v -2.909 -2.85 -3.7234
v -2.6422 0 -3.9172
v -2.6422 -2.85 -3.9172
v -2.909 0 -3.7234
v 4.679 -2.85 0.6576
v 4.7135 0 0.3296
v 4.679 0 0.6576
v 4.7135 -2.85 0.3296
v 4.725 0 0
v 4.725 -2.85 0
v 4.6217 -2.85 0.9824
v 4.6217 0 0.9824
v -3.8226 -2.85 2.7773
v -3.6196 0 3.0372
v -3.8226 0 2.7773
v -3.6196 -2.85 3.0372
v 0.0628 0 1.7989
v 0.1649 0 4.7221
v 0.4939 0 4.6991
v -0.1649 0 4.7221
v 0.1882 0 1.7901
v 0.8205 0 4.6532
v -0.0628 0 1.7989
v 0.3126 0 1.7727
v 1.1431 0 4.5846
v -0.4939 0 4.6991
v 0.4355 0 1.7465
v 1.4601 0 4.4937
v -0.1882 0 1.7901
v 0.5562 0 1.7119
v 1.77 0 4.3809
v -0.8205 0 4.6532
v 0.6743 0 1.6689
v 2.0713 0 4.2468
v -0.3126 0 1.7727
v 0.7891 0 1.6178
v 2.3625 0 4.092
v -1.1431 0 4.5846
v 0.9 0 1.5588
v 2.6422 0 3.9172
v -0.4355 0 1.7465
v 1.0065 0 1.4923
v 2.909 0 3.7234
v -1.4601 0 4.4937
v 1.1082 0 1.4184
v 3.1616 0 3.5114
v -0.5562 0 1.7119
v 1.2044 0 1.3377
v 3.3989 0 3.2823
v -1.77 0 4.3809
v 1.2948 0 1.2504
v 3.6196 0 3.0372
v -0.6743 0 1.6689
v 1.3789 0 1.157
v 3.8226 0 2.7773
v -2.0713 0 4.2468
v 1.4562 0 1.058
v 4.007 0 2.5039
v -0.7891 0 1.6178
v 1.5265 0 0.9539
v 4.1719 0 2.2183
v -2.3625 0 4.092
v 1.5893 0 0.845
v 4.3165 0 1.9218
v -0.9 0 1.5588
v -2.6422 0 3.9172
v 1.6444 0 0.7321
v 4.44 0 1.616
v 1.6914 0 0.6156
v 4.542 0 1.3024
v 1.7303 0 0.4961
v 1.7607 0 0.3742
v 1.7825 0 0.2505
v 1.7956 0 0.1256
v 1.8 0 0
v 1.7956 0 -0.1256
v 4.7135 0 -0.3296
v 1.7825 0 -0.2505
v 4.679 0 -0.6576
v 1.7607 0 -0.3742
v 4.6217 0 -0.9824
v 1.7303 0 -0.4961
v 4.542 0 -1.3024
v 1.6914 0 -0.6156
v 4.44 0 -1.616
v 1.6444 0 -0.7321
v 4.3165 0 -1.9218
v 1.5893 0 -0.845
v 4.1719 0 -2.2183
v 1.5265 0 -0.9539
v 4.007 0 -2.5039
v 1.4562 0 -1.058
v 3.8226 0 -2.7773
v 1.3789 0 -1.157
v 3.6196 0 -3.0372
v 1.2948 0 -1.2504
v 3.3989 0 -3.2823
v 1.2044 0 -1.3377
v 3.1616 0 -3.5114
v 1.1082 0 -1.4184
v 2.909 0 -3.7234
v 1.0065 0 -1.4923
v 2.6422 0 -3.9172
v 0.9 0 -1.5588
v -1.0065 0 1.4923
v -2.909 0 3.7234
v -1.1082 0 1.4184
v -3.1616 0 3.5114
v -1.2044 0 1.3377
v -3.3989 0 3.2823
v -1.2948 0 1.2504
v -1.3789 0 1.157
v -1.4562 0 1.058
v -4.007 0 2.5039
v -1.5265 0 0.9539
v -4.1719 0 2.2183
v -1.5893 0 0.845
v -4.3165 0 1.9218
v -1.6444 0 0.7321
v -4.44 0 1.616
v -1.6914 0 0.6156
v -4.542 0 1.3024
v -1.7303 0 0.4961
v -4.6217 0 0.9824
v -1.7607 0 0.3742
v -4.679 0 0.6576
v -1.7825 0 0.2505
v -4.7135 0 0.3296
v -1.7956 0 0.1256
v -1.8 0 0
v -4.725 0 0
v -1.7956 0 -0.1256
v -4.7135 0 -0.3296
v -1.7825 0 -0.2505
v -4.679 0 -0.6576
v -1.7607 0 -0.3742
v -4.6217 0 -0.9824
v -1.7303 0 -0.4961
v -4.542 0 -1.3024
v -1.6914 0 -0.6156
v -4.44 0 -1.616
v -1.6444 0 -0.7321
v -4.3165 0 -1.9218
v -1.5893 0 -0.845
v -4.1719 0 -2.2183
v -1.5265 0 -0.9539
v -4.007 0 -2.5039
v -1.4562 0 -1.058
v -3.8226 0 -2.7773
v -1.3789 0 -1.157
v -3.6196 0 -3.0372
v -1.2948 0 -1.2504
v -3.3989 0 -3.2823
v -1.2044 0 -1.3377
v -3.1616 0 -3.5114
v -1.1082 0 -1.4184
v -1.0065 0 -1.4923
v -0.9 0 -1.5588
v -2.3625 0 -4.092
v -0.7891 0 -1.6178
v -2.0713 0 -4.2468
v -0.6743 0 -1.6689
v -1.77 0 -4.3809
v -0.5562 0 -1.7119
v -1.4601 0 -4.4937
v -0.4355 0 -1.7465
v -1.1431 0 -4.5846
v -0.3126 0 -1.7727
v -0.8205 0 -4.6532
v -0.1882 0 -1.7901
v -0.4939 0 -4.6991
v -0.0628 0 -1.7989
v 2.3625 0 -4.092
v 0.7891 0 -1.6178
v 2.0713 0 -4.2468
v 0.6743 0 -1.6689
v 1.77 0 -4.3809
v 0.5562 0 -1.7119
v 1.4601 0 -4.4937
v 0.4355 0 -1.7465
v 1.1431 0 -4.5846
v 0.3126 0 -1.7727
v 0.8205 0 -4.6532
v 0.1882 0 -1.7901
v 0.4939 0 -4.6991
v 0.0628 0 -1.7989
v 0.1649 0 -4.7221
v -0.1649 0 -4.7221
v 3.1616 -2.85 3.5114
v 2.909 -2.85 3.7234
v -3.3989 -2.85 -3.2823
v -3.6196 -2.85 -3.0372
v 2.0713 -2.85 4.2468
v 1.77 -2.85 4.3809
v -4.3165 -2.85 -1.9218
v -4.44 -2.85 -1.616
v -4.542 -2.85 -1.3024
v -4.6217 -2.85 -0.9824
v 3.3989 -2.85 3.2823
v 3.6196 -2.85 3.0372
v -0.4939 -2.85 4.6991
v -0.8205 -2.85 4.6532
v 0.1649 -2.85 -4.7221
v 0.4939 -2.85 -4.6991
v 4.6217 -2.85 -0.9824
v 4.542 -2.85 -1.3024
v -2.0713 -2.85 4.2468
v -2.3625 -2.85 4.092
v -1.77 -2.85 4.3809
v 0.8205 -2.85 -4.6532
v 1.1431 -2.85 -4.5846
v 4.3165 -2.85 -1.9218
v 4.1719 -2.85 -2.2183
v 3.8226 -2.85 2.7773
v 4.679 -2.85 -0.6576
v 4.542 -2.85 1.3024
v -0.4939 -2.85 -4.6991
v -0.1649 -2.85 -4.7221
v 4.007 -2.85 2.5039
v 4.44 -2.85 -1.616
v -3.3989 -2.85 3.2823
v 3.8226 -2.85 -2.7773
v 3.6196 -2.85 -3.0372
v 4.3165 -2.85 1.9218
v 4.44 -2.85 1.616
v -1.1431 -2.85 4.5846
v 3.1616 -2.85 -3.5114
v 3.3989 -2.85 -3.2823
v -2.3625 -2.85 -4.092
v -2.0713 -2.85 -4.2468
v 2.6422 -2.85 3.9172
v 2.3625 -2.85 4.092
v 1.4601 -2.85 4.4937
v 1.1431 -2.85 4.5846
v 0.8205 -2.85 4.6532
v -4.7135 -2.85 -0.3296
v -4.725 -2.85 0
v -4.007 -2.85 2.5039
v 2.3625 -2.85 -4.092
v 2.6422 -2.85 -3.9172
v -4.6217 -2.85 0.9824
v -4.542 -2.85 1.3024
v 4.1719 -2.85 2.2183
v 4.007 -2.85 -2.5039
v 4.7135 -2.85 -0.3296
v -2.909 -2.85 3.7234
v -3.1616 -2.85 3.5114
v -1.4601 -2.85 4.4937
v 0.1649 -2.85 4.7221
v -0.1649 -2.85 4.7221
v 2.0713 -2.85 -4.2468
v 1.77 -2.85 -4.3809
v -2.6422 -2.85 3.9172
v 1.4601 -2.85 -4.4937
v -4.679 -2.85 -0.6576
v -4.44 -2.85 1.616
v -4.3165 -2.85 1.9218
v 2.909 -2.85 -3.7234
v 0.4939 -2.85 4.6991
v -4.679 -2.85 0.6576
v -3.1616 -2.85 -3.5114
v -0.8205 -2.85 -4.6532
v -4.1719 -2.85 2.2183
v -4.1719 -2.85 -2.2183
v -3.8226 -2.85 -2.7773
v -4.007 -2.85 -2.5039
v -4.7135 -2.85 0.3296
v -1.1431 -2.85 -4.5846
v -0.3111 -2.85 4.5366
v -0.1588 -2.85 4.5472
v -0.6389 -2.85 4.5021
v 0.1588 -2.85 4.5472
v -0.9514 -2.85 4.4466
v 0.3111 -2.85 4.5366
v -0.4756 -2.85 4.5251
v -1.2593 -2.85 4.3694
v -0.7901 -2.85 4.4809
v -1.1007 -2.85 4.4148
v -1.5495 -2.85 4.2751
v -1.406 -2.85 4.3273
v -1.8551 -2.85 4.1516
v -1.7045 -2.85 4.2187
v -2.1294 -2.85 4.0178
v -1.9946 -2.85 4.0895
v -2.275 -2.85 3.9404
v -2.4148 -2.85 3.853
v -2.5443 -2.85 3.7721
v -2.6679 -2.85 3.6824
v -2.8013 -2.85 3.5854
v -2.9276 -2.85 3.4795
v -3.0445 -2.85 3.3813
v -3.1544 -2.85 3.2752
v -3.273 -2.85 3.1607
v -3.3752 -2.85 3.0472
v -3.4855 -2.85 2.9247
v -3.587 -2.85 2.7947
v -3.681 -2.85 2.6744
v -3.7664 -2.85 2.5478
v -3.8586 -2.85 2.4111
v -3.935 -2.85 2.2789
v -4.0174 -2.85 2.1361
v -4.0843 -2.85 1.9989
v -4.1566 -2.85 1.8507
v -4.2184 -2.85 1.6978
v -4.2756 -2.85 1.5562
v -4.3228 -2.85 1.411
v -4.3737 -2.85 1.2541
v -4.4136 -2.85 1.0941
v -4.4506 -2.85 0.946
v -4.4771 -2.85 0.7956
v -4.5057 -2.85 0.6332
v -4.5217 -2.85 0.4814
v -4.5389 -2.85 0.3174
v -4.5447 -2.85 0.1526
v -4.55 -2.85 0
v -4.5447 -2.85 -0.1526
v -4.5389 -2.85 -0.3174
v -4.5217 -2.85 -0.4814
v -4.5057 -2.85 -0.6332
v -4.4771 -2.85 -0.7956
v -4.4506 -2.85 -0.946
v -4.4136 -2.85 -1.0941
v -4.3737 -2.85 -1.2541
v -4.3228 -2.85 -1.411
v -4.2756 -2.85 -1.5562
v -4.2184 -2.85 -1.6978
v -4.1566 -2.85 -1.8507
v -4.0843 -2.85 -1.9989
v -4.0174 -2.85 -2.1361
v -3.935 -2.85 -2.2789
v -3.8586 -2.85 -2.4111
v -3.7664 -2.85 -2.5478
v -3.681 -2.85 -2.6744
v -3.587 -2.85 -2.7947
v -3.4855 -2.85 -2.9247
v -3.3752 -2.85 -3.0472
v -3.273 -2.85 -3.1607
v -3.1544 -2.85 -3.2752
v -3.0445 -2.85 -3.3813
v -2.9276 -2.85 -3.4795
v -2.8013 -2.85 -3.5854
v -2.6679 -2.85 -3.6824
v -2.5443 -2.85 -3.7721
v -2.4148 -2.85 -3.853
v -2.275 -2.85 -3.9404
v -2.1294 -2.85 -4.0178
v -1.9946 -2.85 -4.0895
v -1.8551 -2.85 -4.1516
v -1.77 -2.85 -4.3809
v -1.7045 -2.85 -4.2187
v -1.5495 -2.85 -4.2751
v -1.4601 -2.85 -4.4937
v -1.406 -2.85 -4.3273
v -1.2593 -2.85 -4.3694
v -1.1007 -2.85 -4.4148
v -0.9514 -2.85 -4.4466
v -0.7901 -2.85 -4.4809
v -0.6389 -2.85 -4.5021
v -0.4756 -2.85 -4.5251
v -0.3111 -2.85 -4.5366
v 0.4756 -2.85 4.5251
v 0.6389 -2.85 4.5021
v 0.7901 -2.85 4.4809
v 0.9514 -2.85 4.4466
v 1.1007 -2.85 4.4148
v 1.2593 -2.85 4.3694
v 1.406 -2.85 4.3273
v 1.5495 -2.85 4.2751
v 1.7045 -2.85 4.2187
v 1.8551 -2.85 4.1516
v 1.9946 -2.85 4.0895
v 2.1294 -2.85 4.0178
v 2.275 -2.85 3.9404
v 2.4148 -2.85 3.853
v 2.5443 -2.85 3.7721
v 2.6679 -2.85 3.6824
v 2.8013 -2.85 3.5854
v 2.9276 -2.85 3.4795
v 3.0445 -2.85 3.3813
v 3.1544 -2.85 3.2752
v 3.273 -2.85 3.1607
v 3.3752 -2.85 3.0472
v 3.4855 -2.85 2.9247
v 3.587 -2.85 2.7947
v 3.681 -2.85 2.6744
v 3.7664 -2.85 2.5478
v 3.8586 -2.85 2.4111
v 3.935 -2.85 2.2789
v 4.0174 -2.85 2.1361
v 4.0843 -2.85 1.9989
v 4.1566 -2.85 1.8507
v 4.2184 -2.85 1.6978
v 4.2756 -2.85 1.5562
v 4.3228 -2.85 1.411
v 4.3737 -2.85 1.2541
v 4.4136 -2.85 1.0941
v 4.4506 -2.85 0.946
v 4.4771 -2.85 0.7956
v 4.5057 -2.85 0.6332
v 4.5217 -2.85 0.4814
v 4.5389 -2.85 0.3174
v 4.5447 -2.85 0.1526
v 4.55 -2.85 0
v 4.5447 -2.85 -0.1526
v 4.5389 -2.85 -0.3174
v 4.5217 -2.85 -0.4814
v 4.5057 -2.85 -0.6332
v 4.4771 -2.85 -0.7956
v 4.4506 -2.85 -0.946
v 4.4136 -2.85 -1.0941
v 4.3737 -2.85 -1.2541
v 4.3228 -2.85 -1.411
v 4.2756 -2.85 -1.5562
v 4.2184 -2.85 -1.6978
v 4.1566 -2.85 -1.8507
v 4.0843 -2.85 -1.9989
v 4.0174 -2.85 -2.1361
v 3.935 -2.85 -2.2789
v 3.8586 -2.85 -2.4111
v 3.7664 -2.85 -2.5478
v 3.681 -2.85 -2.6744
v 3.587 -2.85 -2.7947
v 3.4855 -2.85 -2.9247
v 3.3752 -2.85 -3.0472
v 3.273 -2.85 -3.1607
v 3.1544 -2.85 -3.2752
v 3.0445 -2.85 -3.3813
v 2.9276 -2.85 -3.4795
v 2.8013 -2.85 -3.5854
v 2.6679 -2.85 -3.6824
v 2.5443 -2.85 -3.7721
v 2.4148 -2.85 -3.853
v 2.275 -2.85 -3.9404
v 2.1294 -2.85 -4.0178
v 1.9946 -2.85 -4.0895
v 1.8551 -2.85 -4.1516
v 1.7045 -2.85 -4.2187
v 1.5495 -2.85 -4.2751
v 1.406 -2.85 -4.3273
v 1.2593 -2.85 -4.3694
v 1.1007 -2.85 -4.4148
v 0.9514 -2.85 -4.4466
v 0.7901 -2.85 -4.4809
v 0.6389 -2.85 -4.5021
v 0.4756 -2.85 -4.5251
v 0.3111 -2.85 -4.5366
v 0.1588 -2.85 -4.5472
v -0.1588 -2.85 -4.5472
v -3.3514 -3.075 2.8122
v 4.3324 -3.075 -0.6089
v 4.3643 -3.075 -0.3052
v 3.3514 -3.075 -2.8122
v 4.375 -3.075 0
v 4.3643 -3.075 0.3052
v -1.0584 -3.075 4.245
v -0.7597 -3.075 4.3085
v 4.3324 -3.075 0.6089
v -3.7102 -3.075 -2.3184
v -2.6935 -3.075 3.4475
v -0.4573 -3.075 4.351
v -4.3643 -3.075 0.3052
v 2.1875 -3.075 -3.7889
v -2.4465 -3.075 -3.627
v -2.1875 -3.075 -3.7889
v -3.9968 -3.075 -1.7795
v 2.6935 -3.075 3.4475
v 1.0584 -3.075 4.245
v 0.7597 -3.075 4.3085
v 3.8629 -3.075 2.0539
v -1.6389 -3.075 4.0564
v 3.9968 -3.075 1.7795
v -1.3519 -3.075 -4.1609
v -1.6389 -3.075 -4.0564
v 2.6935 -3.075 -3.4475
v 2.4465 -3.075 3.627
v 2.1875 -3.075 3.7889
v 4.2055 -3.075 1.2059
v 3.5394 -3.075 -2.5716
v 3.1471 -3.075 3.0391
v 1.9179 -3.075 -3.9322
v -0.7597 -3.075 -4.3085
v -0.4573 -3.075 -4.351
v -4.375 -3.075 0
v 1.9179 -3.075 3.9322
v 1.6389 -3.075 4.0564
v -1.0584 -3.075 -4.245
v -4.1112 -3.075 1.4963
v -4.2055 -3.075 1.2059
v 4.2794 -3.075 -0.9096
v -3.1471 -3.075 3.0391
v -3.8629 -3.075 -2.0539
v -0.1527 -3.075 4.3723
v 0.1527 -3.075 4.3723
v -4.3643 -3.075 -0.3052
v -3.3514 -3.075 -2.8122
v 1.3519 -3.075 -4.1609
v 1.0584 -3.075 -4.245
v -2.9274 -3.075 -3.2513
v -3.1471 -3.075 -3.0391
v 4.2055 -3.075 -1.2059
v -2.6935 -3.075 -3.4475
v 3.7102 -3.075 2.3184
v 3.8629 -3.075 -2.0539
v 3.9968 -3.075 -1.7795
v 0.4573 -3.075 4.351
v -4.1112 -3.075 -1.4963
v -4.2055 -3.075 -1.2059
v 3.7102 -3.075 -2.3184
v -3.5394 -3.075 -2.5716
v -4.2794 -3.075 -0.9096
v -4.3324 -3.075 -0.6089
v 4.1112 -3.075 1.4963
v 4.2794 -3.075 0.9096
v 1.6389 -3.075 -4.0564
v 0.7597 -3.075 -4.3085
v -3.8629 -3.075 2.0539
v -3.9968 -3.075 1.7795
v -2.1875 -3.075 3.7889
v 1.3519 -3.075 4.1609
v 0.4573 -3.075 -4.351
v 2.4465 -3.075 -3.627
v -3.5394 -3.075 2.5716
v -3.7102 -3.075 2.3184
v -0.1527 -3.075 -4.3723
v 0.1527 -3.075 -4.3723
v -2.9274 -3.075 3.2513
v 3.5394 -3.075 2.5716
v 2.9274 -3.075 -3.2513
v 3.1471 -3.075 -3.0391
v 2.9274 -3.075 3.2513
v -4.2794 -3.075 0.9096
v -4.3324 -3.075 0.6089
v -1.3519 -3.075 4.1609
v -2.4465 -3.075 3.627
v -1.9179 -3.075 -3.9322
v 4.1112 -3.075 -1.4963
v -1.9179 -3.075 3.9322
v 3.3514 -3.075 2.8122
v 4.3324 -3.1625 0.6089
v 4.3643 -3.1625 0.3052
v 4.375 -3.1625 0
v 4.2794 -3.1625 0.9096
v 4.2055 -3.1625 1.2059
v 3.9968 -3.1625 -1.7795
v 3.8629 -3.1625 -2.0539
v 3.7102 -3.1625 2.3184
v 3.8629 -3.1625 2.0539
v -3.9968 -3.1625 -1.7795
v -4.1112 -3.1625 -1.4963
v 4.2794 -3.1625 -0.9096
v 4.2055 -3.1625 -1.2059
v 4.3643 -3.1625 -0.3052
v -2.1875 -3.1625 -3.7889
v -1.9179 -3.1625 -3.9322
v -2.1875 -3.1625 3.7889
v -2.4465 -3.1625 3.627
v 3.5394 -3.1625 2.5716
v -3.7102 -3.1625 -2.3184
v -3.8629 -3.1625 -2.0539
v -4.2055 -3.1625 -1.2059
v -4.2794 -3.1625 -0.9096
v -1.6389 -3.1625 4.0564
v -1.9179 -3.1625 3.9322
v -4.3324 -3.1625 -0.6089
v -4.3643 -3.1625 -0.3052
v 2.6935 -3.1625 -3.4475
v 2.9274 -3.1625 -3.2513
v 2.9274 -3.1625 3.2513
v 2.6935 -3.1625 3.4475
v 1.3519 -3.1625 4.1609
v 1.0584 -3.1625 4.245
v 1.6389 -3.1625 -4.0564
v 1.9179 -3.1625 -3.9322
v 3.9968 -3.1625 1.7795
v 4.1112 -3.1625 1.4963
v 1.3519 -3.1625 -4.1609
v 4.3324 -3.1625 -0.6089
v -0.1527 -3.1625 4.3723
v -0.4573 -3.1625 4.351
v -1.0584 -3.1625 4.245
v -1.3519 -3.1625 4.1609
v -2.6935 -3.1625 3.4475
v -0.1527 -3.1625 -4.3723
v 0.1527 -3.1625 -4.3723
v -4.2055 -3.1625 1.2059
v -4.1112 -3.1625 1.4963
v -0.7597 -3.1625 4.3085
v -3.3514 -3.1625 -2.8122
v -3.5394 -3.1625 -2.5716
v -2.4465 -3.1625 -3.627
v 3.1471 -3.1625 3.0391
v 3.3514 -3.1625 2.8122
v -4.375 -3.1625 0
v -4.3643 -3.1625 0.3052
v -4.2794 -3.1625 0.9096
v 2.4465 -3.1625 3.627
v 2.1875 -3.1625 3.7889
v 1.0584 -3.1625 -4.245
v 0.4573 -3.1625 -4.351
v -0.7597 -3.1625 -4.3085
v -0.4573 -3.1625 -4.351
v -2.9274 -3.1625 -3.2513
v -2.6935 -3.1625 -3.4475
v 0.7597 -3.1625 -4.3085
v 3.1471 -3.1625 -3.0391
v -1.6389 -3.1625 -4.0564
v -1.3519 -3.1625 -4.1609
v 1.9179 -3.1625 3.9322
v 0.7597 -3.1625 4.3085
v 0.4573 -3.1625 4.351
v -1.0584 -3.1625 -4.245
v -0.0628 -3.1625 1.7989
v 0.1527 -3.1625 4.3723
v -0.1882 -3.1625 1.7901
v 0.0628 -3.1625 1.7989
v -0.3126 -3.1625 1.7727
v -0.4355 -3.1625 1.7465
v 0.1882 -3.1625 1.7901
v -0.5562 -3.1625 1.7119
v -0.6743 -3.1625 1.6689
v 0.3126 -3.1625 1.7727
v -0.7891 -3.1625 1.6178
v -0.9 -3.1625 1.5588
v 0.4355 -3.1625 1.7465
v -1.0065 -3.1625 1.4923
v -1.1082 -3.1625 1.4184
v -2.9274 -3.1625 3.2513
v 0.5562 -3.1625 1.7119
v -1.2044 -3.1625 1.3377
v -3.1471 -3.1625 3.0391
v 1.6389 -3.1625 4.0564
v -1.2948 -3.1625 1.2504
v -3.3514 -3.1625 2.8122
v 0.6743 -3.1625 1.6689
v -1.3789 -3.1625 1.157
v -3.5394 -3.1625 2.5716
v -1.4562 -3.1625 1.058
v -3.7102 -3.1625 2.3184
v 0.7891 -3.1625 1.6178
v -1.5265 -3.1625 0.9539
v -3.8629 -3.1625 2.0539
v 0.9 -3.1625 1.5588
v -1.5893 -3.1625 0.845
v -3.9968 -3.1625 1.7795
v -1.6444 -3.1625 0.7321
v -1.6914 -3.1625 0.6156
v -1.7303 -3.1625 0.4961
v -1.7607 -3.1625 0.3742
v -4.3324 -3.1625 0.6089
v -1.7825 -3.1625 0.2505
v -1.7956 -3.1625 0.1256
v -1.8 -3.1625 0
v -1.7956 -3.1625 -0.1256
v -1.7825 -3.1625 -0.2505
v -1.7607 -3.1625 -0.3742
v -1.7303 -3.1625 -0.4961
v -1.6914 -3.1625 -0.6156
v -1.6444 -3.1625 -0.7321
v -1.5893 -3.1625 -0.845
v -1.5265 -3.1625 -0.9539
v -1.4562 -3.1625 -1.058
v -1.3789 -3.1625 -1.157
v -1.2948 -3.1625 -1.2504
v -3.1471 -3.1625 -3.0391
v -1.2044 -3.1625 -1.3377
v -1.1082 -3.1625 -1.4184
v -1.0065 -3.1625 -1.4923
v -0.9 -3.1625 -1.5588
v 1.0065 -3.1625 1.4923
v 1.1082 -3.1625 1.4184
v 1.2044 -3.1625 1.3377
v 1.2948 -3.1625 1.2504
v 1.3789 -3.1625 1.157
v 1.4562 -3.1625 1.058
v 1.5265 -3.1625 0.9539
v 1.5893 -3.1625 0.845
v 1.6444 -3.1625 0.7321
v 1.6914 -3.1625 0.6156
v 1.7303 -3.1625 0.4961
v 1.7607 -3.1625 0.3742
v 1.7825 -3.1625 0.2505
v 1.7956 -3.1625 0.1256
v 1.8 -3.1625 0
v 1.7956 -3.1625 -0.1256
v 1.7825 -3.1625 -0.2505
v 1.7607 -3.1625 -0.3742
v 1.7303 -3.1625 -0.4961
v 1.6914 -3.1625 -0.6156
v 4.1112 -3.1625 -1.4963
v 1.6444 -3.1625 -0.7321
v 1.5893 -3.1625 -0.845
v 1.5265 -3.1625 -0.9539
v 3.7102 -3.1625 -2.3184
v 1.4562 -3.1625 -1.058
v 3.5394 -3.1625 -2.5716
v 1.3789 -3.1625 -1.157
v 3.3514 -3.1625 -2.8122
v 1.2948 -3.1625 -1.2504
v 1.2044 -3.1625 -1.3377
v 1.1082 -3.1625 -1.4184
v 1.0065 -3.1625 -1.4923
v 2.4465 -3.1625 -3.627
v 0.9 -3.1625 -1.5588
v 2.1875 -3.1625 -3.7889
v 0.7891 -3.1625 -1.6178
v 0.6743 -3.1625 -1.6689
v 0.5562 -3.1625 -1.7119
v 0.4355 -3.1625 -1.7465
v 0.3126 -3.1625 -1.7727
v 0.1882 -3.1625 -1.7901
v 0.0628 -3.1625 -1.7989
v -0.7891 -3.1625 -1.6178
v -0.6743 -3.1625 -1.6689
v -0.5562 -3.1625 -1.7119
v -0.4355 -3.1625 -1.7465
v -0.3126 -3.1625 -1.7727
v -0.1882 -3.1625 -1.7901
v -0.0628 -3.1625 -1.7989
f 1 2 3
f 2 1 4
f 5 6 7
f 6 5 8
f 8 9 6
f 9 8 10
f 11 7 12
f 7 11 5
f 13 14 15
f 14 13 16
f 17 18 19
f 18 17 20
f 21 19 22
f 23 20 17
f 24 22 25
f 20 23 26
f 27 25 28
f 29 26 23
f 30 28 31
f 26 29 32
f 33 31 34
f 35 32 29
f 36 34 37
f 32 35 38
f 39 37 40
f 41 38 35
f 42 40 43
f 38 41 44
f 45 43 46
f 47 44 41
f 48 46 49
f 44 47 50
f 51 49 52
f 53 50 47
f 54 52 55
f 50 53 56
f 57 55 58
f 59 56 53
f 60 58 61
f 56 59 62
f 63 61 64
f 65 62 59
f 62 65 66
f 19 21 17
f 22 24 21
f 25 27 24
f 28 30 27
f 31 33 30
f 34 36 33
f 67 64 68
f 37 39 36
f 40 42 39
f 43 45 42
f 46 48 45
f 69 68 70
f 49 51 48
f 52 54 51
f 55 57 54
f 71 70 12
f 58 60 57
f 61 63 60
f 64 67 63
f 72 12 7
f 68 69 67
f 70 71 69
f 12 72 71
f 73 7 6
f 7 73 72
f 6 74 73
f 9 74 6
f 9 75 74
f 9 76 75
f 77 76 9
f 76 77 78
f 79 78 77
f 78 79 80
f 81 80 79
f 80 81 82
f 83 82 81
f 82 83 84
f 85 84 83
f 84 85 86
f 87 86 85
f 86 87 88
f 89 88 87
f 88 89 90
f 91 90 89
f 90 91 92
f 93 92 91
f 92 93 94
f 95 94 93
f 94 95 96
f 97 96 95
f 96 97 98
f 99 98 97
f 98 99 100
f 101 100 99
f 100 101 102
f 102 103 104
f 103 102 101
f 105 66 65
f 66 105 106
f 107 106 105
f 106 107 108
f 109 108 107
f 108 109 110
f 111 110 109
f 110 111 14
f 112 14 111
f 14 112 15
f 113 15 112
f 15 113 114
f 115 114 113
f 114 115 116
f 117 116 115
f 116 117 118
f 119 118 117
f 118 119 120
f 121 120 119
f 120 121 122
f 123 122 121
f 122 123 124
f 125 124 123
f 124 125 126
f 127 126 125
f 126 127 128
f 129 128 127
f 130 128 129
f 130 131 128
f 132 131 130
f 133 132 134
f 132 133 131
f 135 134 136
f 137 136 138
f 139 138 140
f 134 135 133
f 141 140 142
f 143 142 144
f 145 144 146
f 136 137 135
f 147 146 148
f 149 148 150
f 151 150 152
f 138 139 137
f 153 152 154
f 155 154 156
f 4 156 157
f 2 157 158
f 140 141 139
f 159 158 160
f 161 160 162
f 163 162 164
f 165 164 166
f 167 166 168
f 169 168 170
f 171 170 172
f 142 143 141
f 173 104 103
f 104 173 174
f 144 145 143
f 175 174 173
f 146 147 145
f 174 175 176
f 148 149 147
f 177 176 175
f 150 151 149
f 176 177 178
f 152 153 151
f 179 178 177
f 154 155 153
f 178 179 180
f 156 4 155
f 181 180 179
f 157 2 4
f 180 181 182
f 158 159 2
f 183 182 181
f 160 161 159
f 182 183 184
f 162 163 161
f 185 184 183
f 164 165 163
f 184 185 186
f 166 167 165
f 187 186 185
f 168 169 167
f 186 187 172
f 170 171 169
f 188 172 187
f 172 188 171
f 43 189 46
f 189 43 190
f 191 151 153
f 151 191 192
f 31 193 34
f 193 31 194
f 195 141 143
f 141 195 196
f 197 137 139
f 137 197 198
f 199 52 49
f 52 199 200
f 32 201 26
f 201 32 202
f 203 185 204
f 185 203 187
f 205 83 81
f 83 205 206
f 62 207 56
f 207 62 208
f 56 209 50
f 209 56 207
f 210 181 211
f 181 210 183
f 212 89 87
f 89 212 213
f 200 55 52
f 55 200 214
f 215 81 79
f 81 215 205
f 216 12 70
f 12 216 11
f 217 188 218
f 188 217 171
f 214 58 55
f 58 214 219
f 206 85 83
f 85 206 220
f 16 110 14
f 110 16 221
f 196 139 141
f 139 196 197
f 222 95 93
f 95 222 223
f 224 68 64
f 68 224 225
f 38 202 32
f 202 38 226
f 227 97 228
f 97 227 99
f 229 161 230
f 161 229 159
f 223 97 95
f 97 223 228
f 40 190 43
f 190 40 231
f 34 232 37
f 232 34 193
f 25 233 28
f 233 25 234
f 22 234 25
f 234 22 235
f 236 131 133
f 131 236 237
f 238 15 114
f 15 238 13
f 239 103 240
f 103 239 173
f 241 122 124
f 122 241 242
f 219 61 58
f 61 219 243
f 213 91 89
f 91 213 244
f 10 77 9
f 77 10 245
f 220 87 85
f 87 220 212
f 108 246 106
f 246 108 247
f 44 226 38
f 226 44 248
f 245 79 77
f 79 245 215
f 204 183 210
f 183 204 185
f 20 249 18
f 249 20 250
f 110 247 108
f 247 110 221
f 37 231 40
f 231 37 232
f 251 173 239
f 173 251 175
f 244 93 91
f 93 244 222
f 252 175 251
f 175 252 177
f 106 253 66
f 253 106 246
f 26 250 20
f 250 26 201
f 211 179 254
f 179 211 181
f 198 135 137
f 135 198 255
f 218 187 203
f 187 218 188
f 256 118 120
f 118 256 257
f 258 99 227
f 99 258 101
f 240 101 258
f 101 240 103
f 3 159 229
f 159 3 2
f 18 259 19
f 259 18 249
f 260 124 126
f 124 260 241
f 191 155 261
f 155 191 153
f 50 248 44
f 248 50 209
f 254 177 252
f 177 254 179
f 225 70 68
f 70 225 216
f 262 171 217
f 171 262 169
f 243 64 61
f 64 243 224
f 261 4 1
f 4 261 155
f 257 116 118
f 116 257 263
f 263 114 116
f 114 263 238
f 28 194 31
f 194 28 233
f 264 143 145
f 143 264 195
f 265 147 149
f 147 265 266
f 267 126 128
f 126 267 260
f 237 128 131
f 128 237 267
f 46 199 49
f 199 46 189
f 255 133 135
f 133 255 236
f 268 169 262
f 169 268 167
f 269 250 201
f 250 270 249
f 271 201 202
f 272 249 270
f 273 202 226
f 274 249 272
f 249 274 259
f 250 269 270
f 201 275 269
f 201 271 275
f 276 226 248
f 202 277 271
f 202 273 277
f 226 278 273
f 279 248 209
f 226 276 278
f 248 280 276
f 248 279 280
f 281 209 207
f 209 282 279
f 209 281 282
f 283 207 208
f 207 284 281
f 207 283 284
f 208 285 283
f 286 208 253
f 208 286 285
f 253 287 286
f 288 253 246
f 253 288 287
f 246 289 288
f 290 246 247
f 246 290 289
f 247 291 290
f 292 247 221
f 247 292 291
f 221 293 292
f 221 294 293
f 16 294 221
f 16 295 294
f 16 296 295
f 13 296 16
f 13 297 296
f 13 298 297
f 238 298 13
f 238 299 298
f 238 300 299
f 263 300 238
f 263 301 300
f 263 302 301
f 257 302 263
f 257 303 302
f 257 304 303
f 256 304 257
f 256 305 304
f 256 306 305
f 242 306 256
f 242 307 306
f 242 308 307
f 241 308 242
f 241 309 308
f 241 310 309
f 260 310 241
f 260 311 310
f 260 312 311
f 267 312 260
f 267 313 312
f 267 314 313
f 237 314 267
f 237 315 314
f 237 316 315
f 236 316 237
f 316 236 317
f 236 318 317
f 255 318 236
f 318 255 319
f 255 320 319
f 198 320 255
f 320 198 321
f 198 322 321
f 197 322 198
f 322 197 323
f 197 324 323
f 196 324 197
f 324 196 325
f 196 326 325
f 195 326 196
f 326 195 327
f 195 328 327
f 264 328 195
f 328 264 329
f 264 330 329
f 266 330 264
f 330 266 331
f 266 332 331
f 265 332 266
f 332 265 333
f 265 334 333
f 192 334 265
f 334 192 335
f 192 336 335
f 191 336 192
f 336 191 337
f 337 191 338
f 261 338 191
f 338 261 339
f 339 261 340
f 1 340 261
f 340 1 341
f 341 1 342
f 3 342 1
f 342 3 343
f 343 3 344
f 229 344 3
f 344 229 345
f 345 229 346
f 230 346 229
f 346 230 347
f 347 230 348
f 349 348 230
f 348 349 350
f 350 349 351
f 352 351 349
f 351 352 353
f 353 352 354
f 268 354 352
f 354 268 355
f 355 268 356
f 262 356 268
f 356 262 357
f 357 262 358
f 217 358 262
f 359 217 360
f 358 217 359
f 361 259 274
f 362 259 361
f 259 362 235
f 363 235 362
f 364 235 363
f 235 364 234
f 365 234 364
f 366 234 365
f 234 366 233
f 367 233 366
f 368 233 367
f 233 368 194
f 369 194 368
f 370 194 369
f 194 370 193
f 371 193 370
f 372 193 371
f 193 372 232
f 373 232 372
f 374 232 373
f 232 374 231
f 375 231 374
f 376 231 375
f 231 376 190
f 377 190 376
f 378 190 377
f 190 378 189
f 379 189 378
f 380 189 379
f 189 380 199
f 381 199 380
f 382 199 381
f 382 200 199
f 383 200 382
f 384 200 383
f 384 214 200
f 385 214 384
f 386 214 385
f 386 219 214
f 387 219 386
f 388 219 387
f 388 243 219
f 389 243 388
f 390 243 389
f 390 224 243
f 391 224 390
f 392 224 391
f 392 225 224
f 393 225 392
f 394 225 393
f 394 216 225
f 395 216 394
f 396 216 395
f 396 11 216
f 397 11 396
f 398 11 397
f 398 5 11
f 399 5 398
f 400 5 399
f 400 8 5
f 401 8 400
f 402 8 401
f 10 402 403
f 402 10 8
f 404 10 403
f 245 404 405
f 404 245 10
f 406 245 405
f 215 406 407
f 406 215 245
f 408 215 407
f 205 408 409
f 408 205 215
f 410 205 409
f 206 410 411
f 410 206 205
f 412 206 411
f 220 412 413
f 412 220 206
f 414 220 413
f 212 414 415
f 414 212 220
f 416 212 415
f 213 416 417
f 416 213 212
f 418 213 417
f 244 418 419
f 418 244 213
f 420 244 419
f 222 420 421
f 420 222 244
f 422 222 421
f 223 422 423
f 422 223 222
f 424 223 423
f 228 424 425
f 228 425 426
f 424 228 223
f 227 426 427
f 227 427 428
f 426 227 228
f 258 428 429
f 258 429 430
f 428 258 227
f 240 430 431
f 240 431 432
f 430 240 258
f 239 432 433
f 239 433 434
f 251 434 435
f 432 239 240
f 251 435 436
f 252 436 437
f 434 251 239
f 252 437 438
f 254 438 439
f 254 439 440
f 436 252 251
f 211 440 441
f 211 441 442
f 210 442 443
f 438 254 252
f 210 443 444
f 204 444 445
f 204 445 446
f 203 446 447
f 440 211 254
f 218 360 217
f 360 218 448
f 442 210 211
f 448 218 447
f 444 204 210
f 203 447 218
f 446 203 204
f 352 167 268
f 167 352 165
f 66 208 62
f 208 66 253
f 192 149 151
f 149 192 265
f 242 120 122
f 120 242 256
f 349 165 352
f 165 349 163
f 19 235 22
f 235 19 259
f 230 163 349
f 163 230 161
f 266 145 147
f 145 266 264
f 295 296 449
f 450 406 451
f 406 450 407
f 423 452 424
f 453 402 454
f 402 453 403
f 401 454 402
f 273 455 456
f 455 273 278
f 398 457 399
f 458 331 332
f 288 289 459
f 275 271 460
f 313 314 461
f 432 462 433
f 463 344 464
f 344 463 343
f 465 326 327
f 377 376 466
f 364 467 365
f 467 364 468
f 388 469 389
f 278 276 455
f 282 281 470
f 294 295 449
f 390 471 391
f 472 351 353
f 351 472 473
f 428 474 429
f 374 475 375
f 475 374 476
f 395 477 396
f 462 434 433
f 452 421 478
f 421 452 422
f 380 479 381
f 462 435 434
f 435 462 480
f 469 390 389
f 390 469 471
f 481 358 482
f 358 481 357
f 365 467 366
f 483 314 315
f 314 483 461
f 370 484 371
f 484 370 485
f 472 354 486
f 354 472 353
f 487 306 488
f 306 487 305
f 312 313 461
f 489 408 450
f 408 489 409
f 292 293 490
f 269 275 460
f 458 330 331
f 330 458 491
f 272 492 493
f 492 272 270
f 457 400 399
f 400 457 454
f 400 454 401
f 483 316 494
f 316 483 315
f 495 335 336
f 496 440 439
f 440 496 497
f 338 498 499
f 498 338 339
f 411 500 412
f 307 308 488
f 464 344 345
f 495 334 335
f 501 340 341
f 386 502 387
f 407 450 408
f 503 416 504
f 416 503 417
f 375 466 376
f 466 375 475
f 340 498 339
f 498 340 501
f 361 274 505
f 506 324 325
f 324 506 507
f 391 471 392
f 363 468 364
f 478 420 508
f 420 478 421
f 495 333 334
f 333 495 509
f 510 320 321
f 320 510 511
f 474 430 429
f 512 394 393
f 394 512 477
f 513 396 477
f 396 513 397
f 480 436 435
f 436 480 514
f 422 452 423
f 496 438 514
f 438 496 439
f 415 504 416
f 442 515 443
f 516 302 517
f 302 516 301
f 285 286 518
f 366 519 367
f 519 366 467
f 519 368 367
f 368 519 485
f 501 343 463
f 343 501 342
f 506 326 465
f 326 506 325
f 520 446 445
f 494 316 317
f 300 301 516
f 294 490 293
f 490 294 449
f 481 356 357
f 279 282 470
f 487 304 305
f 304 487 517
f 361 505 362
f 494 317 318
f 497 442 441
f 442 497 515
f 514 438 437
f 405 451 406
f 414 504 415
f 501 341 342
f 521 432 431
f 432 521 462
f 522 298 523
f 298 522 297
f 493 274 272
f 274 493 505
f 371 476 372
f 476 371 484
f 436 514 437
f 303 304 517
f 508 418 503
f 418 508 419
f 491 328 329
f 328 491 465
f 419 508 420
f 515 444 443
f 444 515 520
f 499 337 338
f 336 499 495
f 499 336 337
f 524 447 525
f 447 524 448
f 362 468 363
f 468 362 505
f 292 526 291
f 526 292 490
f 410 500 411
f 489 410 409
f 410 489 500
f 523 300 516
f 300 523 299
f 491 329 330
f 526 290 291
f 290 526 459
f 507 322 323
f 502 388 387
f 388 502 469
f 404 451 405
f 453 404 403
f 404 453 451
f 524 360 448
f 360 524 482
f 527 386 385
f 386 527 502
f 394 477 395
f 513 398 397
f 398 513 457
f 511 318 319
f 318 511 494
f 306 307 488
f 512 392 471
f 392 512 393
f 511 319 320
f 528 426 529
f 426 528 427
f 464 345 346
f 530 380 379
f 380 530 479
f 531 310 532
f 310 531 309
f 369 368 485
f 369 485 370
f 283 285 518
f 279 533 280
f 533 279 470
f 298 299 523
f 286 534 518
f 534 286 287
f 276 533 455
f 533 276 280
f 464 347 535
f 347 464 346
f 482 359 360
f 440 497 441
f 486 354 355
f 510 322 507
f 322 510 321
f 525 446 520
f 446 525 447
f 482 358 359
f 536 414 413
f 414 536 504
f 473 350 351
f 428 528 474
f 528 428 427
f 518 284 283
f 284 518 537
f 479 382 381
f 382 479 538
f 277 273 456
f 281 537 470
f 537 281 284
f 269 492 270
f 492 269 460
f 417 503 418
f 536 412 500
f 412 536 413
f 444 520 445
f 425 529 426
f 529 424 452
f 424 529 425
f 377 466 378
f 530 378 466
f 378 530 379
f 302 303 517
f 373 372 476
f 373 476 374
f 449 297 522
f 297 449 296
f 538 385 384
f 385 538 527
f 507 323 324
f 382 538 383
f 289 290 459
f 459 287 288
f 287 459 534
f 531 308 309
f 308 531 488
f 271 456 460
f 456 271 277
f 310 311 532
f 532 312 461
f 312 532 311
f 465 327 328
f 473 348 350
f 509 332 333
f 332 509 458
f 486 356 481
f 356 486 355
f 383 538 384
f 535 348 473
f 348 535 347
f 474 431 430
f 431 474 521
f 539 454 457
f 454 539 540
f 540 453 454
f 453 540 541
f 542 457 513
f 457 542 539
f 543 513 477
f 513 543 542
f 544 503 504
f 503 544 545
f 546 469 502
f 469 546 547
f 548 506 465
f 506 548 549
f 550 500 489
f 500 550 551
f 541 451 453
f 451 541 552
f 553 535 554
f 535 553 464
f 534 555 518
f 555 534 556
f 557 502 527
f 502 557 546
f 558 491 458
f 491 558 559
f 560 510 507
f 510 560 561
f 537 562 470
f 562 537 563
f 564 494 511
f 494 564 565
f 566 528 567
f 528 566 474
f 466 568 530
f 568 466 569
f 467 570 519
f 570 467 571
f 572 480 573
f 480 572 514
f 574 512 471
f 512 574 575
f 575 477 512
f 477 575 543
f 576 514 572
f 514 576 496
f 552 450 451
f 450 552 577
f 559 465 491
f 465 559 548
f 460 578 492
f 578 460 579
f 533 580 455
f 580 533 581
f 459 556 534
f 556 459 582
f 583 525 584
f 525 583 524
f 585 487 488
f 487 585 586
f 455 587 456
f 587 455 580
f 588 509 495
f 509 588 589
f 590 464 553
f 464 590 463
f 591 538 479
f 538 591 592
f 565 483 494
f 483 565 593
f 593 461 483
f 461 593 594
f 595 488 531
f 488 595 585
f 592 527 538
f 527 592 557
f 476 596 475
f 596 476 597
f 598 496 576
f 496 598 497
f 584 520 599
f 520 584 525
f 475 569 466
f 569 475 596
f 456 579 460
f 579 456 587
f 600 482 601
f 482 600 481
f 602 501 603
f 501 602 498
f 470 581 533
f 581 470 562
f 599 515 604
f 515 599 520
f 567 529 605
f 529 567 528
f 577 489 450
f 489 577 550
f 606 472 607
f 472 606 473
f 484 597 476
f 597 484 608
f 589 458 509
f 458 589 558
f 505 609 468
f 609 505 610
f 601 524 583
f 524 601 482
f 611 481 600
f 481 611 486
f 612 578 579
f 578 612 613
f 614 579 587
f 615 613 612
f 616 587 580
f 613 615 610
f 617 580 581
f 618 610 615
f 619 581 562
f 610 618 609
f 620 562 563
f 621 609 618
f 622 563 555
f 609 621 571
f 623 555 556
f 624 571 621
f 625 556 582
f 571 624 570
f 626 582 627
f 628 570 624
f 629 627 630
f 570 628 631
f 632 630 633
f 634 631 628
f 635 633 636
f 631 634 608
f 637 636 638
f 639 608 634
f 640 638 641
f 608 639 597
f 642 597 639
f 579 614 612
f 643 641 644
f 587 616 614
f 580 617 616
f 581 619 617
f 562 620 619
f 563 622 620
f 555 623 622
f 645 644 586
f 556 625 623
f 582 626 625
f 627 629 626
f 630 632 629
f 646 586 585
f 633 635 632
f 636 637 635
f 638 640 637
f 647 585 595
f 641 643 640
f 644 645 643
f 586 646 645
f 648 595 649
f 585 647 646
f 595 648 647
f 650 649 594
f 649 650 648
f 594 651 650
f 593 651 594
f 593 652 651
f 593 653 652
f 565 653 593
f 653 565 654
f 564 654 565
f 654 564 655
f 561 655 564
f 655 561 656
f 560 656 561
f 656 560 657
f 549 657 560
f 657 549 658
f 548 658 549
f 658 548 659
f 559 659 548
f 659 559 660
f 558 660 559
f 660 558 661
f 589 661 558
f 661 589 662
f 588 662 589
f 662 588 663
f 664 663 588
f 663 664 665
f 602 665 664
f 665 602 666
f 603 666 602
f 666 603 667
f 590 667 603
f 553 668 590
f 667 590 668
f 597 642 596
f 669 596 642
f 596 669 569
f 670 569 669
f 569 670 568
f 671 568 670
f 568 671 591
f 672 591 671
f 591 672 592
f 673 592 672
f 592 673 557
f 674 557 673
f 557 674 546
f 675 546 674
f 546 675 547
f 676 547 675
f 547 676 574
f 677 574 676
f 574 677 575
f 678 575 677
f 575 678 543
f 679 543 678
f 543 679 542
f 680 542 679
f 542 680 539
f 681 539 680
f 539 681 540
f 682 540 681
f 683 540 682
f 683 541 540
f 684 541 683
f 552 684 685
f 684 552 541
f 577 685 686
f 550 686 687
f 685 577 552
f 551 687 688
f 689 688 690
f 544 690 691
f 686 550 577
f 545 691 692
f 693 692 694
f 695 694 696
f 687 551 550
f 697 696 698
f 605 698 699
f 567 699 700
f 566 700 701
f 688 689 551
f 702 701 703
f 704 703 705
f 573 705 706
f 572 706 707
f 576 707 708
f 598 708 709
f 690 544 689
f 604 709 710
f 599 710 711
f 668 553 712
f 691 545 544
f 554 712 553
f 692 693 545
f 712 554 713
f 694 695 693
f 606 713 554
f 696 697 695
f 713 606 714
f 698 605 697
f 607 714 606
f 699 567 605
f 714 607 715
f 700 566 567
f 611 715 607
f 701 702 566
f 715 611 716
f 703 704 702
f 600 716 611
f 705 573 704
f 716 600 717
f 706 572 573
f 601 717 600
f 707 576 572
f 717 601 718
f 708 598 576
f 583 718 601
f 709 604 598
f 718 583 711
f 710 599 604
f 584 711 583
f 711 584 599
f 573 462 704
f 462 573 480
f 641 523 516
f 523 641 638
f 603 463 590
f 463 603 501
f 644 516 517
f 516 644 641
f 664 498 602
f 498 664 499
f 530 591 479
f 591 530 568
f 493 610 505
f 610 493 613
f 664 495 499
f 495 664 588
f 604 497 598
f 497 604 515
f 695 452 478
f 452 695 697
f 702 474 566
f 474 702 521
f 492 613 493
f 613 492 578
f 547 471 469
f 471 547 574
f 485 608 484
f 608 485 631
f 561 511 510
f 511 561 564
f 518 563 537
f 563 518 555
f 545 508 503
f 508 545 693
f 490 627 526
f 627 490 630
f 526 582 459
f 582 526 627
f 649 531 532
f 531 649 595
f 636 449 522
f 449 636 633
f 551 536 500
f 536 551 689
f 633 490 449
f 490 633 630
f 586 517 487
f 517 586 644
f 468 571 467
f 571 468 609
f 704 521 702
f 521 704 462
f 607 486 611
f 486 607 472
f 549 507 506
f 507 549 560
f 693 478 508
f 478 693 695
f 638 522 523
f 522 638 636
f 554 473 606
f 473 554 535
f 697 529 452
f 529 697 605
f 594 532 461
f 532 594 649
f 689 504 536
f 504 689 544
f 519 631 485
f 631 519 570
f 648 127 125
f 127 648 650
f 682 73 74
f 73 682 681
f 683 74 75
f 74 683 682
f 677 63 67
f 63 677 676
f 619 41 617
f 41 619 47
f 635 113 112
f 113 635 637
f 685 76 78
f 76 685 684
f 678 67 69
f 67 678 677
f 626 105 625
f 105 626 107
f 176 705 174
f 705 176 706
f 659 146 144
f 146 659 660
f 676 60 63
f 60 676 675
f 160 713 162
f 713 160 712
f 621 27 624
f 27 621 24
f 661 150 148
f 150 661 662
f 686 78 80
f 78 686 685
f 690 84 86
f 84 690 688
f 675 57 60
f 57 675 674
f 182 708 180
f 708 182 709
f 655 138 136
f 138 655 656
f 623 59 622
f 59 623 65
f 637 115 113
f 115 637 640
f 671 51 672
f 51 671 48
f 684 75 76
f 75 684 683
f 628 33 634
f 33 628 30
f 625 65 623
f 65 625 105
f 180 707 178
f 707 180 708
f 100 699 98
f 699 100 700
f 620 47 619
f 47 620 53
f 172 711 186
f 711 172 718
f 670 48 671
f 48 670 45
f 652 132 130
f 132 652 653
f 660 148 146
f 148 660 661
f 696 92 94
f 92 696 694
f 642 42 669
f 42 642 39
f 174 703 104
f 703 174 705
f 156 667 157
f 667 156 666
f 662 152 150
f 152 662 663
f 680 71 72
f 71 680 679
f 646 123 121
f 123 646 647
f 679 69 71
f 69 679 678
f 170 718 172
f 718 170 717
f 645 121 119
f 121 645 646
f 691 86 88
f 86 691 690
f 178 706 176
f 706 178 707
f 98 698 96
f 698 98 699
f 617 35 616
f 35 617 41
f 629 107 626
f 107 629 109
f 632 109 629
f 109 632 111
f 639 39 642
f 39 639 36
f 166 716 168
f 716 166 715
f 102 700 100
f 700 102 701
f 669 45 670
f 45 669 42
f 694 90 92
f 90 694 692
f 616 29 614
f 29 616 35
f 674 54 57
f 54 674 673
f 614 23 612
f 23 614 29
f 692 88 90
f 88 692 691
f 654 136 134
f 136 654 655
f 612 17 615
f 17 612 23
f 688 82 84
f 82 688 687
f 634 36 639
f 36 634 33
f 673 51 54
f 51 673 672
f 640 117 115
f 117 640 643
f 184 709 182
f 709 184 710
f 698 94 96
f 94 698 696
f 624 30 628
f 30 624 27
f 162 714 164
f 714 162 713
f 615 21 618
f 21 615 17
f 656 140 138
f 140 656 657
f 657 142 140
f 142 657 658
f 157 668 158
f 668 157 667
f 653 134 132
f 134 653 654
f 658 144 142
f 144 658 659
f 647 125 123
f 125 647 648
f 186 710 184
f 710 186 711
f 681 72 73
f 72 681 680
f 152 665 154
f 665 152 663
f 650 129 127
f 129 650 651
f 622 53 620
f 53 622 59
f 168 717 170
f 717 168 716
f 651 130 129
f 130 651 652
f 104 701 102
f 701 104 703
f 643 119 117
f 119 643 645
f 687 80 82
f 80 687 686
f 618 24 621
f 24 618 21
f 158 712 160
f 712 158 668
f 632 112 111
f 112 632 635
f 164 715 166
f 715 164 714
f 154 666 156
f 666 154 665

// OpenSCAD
//
//  **************************************************************
//  * Roulette d'affut pour canon de 36 livres modèle 1780   *
//  **************************************************************
//
// DE36_ROU_V1.scad
//
// Michel RIVIERE 2018 03 15
// V1

include <DE36_REF_V1.scad>;

module ROU(PR3D_Flag=0){

//  Calculs des marges d'assemblage pour le percement de la roulette
//  Diamètre de l'axe intérieur de la roulette légèrement plus grand que l'axe de l'essieu  
//  Sur une impression à support à cire perdue, on peut positionner les roues dès l'impression  
//  Pour impression3D, utilisation des caractéristiques d'impression
//  Pour 3D rendering visuel 1% de marge
//

function ROU_MargeDiametreAxe(PR3D_Flag)=
PR3D_Flag ==1 
    ? MinClearance*2 //Ecartement de pièces si elles sont séparées à l'impression
    : ROU_INT_DIA*0.01;    //marge pour le visuel

translate([0,-ROU_LAR/2,0])
rotate(a=[90,0,0])
difference () {
    union (){

// ROU generation de la roulette
//
        cylinder (h=ROU_LAR,d1=ROU_EXT_DIA,d2=ROU_EXT_DIA,center = true,$fn=Fn_sphere);
        translate(v=[0,0,ROU_LAR/2])
        cylinder (h=ROUMUS_LAR,d1=ROU_EXT_DIA,d2=ROUMUS_DIA,center = true,$fn=Fn_sphere);
        translate(v=[0,0,ROU_LAR/2+ROUMUS_Bord*2])
        cylinder (h=ROUMUS_Bord,d1=ROUMUS_DIA,d2=ROUMUS_DIA,center = true,$fn=Fn_sphere);
        }
       
// Percement de l'axe
//
    cylinder (h=ROU_LAR + ROUMUS_LAR*2 + ROUMUS_Bord*2,
        d1=ROU_INT_DIA+ROU_MargeDiametreAxe(PR3D_Flag),
        d2=ROU_INT_DIA+ROU_MargeDiametreAxe(PR3D_Flag),
        center = true,$fn=Fn_sphere);}      
}
/*Demo*/
ROU(1);
